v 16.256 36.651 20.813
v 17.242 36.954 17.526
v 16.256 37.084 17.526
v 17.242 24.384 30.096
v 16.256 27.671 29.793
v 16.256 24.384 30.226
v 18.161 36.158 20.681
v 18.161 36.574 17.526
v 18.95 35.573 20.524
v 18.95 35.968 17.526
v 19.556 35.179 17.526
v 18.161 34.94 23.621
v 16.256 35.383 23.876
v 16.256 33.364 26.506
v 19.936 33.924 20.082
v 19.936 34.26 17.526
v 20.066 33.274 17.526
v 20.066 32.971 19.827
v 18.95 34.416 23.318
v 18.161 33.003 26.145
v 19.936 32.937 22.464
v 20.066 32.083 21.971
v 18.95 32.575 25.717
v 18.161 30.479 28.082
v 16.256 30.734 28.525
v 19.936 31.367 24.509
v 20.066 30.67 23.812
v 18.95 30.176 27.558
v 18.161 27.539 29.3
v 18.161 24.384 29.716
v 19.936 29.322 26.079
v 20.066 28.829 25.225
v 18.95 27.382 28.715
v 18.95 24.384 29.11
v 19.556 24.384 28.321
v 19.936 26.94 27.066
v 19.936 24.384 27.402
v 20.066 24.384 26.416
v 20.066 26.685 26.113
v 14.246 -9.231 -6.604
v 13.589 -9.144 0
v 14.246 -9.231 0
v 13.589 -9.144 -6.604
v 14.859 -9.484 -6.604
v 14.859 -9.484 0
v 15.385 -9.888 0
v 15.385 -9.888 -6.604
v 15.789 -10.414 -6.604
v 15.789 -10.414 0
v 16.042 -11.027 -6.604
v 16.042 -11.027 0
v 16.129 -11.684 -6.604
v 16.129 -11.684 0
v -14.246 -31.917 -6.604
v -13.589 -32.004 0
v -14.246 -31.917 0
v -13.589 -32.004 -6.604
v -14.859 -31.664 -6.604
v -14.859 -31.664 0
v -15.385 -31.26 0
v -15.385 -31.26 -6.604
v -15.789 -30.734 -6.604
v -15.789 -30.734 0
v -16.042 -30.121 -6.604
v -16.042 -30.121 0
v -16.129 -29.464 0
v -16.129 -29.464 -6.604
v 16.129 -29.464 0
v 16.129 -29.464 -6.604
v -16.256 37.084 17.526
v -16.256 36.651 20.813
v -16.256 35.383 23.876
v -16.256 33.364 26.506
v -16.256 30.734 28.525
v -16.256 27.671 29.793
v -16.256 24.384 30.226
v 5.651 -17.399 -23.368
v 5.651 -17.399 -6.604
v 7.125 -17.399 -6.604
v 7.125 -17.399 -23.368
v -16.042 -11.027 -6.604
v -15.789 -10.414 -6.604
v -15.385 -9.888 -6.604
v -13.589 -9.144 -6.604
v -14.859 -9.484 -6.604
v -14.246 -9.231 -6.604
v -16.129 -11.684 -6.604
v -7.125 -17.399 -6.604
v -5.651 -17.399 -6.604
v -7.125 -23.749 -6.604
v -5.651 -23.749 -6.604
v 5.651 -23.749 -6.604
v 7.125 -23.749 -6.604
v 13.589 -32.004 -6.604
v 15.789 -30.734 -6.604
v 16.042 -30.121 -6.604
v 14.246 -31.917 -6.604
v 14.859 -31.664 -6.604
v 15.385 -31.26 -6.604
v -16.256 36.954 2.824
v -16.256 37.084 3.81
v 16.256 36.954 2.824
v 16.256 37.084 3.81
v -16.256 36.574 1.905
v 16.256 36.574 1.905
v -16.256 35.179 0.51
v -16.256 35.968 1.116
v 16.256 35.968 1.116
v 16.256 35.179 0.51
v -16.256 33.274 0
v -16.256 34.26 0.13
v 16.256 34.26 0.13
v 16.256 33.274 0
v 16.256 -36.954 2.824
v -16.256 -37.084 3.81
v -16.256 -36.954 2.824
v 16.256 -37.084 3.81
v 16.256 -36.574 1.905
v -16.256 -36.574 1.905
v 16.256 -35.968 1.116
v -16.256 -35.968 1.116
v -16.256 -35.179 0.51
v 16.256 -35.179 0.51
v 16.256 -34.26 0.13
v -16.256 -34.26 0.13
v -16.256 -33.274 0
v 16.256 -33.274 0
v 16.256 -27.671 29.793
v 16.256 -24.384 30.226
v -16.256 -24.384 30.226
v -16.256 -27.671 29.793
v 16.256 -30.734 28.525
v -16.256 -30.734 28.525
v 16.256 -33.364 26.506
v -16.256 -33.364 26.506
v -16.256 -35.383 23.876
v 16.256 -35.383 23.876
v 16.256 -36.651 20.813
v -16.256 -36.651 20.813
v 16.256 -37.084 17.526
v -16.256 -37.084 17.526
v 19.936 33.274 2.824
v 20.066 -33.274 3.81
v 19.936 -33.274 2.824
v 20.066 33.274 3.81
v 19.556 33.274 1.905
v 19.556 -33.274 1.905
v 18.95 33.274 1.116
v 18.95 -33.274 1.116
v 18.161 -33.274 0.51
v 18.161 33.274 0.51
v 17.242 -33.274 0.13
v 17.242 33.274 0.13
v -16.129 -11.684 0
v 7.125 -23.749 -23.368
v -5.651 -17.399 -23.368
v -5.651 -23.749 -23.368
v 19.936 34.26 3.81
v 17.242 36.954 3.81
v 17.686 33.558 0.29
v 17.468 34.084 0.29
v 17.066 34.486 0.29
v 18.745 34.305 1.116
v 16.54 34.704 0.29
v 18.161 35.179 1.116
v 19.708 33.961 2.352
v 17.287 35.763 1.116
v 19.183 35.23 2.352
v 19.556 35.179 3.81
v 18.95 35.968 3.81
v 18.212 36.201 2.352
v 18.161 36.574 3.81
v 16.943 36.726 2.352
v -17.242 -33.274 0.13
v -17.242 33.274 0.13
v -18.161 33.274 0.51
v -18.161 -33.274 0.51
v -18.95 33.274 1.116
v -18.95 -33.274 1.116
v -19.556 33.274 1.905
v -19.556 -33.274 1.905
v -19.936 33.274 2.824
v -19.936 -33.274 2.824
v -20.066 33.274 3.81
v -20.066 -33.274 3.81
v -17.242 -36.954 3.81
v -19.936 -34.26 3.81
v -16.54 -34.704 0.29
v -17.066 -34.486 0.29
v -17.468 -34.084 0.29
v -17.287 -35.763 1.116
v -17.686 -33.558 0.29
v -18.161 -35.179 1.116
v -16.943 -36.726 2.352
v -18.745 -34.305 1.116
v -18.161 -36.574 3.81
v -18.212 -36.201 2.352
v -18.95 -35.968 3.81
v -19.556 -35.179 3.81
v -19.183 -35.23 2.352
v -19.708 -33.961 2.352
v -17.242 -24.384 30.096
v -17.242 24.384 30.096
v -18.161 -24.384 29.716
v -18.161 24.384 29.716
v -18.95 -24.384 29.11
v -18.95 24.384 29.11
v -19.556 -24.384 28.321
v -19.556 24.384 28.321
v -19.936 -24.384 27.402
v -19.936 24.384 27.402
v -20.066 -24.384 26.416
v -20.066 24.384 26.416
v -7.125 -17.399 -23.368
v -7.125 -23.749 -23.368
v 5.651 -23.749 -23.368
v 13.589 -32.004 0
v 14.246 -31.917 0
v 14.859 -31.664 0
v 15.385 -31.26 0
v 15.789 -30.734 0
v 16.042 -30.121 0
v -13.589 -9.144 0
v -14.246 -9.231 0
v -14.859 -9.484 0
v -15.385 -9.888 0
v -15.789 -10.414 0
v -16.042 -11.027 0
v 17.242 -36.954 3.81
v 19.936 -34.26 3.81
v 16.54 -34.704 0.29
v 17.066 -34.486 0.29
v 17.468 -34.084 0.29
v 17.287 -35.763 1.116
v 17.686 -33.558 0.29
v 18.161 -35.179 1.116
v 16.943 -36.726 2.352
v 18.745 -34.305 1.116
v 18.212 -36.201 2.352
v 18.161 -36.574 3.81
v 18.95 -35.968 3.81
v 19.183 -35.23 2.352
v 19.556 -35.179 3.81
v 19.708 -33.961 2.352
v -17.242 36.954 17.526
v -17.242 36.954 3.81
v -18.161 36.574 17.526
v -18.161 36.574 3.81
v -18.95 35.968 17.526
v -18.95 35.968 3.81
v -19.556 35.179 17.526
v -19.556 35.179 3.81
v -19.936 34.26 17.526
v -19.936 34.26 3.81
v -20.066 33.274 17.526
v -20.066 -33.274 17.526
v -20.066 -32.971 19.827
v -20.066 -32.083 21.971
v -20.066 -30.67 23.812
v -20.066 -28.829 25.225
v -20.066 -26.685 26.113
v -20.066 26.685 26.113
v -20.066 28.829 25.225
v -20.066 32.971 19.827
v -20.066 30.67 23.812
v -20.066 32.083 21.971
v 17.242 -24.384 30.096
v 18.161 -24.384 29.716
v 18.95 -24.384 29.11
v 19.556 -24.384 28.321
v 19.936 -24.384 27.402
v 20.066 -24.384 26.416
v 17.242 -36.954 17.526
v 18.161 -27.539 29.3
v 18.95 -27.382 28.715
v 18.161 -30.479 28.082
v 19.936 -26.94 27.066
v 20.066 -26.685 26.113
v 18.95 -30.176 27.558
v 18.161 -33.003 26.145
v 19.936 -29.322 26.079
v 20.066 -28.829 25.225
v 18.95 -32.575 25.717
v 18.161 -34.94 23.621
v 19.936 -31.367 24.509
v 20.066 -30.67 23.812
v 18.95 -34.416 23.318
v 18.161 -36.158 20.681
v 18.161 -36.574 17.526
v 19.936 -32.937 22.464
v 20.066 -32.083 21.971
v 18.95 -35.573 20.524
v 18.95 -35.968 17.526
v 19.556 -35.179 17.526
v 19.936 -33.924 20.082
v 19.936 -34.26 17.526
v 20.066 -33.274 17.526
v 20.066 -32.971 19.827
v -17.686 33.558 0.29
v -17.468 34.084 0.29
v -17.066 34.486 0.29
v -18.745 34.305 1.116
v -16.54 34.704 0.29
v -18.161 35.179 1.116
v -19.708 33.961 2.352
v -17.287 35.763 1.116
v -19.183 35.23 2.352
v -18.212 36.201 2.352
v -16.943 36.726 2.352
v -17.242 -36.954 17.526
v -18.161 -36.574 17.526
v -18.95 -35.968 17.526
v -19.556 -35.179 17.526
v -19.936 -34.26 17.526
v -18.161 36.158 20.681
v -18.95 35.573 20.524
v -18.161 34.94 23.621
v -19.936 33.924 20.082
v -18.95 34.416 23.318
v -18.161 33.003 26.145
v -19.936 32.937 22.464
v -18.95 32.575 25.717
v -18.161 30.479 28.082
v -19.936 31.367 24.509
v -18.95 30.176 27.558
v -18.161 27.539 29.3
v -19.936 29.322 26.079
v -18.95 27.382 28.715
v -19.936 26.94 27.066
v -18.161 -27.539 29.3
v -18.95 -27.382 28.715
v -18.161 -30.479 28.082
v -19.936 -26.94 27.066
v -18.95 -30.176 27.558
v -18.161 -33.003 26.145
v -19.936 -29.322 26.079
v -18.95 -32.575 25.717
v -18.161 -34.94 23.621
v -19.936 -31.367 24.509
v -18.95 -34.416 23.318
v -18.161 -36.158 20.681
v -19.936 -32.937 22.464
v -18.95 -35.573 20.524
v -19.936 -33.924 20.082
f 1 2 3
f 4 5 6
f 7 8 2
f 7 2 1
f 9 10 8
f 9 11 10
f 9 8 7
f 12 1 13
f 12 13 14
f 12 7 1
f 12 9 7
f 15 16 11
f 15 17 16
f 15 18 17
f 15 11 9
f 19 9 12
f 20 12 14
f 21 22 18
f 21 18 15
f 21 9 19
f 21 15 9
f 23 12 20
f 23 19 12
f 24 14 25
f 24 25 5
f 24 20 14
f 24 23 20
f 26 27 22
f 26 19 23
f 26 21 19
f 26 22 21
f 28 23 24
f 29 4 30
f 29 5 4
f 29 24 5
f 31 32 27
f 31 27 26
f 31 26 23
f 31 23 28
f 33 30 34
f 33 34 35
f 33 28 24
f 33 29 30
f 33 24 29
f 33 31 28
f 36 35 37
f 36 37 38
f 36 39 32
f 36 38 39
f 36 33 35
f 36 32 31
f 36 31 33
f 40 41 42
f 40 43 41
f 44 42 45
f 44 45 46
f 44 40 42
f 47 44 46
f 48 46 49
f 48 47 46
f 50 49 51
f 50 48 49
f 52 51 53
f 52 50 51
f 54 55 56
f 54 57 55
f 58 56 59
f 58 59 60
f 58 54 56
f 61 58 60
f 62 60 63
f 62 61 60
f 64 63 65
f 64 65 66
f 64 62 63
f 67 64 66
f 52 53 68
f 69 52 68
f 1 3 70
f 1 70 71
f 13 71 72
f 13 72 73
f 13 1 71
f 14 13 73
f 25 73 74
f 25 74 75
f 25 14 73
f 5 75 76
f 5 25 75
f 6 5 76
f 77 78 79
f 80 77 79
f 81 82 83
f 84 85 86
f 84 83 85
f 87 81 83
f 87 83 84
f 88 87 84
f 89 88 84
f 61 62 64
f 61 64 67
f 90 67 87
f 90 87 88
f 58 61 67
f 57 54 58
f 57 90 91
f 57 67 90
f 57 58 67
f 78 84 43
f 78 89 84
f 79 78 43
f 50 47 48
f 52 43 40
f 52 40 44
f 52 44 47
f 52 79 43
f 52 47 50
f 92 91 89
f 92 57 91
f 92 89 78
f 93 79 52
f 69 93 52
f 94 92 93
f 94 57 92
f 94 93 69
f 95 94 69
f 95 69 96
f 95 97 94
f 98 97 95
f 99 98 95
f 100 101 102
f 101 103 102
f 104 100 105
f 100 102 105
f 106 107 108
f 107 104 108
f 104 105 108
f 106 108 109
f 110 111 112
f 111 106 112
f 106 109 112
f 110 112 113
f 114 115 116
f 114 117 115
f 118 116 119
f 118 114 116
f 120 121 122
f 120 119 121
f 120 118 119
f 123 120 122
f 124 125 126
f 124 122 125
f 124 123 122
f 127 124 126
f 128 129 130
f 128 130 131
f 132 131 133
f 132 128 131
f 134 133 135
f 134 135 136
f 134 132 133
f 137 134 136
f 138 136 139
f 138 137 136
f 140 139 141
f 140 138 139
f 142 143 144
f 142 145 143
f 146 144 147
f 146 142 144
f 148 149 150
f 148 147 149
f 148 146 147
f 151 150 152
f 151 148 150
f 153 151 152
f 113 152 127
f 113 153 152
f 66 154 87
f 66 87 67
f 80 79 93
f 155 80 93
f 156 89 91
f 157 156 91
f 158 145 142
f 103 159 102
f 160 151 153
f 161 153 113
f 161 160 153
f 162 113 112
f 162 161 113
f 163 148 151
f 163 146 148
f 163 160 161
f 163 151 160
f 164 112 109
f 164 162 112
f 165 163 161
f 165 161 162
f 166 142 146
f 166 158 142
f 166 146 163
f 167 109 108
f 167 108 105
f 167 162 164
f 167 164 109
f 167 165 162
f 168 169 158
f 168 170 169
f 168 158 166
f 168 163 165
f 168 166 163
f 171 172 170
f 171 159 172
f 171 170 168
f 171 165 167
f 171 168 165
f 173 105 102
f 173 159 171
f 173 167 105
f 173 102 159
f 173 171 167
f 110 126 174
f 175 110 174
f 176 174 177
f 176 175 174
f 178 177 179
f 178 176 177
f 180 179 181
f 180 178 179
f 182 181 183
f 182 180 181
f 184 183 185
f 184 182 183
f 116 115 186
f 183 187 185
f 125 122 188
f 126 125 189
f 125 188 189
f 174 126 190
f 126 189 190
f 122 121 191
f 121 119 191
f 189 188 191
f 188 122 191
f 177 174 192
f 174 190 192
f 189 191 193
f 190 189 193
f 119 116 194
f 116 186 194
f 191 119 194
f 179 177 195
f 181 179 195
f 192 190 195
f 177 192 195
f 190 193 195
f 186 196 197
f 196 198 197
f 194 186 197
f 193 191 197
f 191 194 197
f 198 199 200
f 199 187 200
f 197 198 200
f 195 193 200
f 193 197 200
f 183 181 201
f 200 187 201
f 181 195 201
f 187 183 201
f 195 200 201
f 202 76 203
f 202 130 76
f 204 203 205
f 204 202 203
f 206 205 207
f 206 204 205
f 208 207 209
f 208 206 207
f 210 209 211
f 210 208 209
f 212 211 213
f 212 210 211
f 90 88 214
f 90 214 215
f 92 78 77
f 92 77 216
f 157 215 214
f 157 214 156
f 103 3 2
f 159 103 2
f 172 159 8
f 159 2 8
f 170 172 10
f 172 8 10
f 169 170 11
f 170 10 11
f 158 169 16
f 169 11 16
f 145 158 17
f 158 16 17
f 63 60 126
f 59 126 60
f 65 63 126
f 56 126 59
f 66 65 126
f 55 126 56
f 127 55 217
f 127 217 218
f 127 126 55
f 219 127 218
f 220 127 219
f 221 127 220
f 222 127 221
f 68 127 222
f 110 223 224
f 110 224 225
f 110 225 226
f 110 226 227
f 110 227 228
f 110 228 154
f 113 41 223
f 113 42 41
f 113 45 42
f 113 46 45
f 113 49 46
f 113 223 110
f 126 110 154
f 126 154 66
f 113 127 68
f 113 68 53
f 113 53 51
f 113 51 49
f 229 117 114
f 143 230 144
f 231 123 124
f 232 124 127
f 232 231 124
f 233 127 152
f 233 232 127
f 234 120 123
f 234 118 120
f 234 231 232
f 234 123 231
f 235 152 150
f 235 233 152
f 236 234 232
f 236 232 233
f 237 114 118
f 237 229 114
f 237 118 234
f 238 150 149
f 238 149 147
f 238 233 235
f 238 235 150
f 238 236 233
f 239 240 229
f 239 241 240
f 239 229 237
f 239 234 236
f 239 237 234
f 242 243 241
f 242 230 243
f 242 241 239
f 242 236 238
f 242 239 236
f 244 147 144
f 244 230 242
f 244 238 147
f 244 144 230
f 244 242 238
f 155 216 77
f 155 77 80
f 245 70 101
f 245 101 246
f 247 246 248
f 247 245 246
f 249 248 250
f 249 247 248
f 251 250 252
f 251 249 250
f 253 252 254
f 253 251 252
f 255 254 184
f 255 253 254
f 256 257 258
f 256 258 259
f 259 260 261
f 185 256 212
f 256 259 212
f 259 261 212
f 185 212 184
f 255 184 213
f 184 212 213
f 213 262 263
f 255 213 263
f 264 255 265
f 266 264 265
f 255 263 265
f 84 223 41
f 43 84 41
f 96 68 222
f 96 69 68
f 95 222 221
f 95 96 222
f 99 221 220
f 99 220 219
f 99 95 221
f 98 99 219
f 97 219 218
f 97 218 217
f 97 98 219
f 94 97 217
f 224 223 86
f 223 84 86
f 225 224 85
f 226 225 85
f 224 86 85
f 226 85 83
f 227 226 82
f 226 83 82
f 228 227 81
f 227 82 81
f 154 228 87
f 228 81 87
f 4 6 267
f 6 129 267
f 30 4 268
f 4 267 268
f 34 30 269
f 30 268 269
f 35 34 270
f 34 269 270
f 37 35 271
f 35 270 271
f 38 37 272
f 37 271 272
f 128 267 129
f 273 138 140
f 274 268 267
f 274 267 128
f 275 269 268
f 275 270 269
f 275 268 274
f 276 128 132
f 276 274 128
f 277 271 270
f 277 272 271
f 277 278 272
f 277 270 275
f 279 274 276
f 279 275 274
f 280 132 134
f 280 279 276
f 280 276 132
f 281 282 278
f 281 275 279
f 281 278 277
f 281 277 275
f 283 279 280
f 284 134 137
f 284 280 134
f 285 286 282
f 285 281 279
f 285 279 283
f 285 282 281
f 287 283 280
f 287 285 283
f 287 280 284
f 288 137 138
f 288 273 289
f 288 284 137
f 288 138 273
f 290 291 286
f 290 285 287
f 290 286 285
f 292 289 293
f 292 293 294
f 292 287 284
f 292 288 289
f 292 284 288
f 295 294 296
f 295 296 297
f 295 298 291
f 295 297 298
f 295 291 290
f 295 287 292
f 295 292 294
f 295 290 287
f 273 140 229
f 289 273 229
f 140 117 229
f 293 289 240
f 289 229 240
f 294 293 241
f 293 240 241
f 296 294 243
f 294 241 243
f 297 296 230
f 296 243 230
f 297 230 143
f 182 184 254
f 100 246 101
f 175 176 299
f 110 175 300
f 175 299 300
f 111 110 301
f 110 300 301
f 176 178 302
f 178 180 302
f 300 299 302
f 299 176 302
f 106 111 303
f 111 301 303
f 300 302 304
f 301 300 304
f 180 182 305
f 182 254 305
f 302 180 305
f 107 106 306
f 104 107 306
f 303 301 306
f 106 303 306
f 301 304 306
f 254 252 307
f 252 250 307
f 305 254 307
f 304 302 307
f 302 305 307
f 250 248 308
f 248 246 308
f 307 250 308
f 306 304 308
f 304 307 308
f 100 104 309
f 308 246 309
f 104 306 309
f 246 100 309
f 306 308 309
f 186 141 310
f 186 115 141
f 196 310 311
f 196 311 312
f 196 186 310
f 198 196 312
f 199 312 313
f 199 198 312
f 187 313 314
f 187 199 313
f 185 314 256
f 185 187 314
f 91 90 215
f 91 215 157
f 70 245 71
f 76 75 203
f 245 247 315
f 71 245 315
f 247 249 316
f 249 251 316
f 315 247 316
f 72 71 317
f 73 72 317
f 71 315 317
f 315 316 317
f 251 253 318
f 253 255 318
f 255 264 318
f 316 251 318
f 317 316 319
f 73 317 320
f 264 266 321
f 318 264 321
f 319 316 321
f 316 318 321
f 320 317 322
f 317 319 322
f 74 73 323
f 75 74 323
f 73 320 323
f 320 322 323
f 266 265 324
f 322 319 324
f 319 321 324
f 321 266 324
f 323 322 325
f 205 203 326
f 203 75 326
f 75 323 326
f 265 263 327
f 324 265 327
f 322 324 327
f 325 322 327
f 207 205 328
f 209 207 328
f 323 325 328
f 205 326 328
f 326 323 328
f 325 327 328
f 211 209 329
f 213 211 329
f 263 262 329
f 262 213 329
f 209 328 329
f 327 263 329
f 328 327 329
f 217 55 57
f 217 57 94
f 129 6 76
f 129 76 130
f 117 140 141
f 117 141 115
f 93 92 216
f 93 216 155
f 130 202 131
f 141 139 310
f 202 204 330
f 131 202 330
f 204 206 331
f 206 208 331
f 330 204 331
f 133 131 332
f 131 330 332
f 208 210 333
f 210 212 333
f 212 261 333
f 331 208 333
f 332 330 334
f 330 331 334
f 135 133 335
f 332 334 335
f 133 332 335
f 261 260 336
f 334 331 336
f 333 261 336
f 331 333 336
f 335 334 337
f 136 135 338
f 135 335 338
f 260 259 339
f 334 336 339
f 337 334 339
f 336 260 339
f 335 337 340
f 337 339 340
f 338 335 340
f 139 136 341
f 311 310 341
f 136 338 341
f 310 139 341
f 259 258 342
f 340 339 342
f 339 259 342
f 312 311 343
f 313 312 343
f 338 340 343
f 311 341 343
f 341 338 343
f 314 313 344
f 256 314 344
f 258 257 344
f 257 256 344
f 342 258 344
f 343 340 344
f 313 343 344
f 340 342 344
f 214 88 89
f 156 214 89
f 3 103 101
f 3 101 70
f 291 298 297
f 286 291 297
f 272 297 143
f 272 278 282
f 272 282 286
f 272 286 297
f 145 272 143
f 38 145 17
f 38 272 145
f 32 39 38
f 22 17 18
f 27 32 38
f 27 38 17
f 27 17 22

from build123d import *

# Parameters (mm, degrees)
F1_DEPTH = 20.066
F2_R     = 3.81
F3_W     = 32.258
F3_H     = 22.86
F4_DEPTH = 6.604
F5_R     = 2.54
F6_W     = 1.4732
F6_H     = 6.35
F7_DEPTH = 16.764


with BuildPart() as f1:
    # F0 (on Right) → F1 (new body, symmetric)
    with BuildSketch(Plane.YZ):
        with BuildLine():
            Line((-37.084, 17.526), (-37.084, 0))
            Line((-37.084, 0), (37.084, 0))
            Line((37.084, 0), (37.084, 17.526))
            ThreePointArc((37.084, 17.526), (33.364256, 26.506256), (24.384, 30.226))
            Line((24.384, 30.226), (-24.384, 30.226))
            ThreePointArc((-24.384, 30.226), (-33.364256, 26.506256), (-37.084, 17.526))
        make_face()
    extrude(amount=F1_DEPTH, both=True)

    # F2
    f2_edges = [f1.edges().sort_by_distance(p)[0] for p in [
        (20.066, 0, 30.226),
        (-20.066, 0, 30.226),
        (0, -37.084, 0),
        (20.066, 0, 0),
        (-20.066, 0, 0),
        (0, 37.084, 0),
    ]]
    fillet(f2_edges, radius=F2_R)

    # F3 (on face) → F4 (join)
    with BuildSketch(Plane(origin=(0, 0, 0), x_dir=(1, 0, 0), z_dir=(0, 0, -1))):
        with Locations((0, 20.574)):
            Rectangle(F3_W, F3_H)
    extrude(amount=F4_DEPTH)

    # F5
    f5_edges = [f1.edges().sort_by_distance(p)[0] for p in [
        (16.129, -9.144, -3.302),
        (16.129, -32.004, -3.302),
        (-16.129, -32.004, -3.302),
        (-16.129, -9.144, -3.302),
    ]]
    fillet(f5_edges, radius=F5_R)

    # F6 (on face) → F7 (join)
    with BuildSketch(Plane(origin=(0, 0, -6.604), x_dir=(1, 0, 0), z_dir=(0, 0, -1))):
        with Locations((6.3881, 20.574)):
            Rectangle(F6_W, F6_H)
        with Locations((-6.3881, 20.574)):
            Rectangle(F6_W, F6_H)
    extrude(amount=F7_DEPTH)


solid = f1.part
